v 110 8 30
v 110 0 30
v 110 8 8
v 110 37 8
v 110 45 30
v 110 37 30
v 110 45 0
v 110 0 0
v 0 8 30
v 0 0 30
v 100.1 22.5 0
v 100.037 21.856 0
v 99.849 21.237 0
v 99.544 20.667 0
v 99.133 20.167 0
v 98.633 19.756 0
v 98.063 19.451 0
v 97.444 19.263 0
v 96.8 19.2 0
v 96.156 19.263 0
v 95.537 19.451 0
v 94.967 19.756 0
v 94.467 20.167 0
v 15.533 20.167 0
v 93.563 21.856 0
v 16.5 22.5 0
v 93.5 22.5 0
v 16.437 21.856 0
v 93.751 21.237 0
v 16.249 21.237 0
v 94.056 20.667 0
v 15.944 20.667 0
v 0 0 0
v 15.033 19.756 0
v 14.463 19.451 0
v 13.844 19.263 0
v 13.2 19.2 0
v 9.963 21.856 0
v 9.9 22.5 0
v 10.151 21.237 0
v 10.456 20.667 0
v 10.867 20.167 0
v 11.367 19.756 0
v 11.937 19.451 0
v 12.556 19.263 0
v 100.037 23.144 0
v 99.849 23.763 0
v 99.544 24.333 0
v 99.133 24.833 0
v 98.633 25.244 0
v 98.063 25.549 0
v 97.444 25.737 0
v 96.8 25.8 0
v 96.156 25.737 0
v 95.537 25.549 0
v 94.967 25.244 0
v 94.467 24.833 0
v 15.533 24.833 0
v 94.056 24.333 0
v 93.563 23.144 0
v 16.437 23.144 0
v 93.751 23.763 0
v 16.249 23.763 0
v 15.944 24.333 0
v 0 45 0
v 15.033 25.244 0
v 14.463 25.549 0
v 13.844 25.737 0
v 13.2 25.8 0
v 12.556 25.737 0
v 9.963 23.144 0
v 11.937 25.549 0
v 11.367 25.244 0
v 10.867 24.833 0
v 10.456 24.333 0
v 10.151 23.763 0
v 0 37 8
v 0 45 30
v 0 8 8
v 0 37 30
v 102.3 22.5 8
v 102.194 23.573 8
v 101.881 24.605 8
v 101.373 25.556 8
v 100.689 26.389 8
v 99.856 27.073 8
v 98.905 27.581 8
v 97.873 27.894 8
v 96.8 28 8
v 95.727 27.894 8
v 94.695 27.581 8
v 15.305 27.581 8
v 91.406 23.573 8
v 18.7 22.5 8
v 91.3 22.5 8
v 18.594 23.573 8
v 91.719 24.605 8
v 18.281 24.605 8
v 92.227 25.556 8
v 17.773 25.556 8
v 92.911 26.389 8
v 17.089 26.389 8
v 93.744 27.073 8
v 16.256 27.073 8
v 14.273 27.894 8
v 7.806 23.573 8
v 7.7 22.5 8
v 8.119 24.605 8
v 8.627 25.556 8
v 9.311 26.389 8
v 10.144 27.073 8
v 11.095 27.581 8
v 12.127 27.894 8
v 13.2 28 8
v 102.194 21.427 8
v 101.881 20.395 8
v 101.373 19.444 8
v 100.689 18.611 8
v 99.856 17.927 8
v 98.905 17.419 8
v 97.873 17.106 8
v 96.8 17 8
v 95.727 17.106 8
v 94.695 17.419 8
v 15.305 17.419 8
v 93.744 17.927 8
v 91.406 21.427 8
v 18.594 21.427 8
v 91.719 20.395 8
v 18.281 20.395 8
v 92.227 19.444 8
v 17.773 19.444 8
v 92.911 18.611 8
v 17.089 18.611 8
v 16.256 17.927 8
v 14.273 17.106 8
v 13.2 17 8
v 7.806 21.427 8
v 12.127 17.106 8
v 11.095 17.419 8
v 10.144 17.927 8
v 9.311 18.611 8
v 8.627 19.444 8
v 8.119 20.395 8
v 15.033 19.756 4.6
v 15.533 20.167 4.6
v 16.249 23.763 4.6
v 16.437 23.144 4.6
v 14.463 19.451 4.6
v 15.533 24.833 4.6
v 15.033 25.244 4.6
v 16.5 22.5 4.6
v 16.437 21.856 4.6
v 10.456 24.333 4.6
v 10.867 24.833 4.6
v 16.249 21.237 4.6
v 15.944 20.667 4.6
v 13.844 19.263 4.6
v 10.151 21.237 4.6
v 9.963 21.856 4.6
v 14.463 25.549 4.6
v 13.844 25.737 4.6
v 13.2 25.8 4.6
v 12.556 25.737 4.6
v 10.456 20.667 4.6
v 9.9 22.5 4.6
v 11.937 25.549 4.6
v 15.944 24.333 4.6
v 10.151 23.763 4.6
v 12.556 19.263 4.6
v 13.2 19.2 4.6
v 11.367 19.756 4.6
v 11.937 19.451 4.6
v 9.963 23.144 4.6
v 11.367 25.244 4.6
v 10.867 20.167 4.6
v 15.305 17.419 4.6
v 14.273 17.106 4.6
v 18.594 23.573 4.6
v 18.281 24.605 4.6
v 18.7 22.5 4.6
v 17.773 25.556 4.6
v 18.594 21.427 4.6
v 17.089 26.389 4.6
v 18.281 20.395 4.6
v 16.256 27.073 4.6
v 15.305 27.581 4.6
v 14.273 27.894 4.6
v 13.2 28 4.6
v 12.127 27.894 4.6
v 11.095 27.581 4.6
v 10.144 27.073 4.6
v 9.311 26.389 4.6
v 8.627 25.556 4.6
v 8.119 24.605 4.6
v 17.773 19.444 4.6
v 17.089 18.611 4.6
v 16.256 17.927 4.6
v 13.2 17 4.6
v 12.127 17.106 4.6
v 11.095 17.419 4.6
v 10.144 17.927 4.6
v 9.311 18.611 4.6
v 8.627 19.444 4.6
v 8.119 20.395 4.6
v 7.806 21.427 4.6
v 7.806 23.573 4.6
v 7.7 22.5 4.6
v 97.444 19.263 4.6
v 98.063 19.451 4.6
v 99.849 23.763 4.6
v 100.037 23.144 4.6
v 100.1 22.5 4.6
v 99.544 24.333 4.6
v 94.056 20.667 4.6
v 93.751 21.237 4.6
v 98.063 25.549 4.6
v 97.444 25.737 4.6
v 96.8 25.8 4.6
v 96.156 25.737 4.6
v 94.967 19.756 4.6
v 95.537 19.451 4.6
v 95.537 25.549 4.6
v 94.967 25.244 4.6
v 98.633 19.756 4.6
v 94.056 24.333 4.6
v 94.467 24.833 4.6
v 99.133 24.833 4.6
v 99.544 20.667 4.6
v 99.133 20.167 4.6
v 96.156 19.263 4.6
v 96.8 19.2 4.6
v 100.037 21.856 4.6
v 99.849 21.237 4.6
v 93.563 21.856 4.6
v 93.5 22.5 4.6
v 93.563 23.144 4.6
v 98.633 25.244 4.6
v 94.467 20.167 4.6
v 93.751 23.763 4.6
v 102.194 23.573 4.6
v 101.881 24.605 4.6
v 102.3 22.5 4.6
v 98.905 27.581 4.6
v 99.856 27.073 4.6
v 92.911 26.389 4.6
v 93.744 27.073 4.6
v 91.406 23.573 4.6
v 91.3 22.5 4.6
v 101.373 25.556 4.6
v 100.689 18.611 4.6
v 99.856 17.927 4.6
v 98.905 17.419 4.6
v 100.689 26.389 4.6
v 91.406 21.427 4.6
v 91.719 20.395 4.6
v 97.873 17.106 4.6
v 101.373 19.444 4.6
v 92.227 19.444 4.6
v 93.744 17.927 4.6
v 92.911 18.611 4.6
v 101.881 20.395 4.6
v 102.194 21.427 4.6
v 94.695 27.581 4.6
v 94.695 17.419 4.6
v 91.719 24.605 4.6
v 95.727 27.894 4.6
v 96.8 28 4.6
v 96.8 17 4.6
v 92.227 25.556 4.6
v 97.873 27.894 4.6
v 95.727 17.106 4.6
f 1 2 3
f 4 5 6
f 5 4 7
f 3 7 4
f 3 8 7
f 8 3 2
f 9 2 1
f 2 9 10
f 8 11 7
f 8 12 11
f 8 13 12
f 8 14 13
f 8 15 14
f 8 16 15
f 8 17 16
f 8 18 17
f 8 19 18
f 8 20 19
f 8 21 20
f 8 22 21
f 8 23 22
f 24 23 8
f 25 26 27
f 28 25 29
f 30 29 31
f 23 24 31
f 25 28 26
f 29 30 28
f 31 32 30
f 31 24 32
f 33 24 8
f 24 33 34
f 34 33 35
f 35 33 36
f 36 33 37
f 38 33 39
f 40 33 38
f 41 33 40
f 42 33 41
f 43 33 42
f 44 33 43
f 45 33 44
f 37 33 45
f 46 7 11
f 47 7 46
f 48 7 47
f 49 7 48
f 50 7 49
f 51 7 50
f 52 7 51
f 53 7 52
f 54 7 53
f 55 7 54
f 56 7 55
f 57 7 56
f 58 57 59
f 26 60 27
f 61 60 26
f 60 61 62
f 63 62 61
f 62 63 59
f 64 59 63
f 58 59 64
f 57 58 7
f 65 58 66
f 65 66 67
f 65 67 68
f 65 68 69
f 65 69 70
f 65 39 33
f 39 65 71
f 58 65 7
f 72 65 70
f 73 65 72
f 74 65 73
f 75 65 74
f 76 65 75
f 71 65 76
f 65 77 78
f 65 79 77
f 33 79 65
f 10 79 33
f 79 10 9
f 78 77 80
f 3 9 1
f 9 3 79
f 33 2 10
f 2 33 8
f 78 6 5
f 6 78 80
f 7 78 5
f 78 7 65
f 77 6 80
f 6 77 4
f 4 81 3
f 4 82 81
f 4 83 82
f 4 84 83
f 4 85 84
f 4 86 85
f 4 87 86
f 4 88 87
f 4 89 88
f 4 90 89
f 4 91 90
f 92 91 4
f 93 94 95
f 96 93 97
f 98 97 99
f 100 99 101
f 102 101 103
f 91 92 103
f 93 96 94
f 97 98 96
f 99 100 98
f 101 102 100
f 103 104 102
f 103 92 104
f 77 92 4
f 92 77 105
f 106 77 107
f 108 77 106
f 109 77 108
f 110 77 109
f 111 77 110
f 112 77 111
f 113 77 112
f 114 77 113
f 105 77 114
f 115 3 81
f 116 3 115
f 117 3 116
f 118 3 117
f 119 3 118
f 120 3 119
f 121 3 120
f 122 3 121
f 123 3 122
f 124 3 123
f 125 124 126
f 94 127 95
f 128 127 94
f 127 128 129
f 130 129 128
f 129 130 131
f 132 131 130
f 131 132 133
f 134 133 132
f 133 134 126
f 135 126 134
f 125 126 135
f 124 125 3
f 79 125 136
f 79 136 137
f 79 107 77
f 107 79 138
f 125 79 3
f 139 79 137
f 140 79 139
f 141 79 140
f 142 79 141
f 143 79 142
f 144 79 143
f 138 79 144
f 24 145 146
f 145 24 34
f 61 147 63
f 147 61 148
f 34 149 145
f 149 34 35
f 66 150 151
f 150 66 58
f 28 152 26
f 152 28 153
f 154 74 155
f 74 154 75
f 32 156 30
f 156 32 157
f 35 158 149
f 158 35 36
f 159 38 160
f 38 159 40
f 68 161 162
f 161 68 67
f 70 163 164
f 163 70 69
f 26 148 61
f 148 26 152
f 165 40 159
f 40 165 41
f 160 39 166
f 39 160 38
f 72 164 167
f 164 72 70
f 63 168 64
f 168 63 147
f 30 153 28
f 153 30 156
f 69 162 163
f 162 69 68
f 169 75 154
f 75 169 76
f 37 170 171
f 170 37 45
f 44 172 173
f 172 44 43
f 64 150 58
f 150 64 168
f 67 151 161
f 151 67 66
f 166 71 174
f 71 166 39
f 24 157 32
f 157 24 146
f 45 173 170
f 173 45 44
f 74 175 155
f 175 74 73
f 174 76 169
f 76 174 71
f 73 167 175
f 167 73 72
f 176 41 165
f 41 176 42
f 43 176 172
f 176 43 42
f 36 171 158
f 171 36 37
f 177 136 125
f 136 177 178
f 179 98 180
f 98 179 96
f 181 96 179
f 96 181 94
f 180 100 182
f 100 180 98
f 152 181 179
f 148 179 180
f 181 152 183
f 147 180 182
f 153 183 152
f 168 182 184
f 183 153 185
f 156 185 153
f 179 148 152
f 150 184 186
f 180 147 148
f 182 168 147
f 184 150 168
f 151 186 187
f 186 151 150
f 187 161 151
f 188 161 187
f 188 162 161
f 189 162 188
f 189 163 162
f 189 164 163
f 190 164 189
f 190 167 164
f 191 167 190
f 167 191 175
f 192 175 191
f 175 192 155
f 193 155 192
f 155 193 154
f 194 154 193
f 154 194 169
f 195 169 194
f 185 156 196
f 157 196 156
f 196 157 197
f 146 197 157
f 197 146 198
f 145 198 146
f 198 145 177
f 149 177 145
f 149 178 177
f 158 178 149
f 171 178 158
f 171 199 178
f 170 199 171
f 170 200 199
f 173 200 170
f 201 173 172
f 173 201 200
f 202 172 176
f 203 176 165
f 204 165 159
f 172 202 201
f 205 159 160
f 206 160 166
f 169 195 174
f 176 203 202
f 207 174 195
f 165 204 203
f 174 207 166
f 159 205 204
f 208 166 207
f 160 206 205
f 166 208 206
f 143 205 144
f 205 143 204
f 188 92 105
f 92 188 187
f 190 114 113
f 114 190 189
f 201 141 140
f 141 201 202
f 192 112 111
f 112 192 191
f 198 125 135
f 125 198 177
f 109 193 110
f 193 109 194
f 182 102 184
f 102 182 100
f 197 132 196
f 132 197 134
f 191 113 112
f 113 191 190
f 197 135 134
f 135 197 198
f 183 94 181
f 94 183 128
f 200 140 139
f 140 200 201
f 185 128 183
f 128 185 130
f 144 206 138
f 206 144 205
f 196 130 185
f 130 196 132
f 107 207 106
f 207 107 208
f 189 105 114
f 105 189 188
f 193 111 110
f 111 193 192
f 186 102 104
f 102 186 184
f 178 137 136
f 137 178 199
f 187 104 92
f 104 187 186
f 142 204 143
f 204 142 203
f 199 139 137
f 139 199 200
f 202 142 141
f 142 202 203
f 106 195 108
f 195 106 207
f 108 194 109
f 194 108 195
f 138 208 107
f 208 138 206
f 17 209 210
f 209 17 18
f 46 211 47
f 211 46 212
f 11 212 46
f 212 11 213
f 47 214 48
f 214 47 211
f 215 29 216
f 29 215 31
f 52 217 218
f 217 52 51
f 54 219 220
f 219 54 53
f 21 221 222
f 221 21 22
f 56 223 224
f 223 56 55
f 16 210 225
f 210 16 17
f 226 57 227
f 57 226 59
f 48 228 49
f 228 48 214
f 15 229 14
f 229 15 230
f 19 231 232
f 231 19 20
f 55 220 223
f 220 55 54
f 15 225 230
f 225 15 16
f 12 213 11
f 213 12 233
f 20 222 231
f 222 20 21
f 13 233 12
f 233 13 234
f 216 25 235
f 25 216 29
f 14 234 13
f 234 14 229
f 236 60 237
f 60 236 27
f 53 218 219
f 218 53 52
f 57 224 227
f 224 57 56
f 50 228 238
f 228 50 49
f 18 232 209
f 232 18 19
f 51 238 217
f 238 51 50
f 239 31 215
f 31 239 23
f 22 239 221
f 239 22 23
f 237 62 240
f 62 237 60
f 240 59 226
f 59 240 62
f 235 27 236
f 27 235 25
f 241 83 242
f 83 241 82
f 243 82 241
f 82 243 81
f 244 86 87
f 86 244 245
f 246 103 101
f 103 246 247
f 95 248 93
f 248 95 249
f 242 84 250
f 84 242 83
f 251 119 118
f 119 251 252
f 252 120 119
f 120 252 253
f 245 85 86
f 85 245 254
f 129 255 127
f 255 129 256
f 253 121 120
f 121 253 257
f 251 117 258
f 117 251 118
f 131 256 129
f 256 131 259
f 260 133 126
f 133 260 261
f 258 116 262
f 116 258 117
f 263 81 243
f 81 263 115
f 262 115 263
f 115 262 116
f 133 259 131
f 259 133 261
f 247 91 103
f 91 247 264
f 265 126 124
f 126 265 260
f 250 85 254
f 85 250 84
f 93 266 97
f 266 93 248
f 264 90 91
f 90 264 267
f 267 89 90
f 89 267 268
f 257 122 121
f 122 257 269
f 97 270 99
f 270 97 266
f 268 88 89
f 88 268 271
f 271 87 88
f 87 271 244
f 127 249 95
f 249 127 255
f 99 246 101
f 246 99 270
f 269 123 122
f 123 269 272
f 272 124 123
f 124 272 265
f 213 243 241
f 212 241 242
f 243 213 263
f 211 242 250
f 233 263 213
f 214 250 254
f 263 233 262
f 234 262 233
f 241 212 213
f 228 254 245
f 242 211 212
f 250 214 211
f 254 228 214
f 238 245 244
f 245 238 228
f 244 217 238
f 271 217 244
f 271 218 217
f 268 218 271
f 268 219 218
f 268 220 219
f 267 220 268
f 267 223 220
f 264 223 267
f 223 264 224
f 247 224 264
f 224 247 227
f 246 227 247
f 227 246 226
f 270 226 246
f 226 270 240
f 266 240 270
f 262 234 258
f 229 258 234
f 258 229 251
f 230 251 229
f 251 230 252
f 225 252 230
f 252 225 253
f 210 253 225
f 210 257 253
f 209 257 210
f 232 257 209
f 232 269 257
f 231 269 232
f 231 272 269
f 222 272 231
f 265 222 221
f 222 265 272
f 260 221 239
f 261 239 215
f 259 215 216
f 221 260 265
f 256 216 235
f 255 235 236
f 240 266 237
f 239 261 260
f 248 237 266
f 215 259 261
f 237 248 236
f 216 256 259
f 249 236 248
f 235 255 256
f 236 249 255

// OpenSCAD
$fn = 32;

// ----------------------------------------------------------------------
// U-bracket: 110 x 45 x 30 mm
// ----------------------------------------------------------------------

// --- parameters (mm) ---
span = 110;               // outer length, X
outer_w = 45;             // outer width, Y
wall_h = 30;              // upright height, Z
plate_t = 8;              // wall thickness
hole_d = 6.6;             // clearance for M6
cb_d = 11;                // counterbore diameter
cb_h = 3.4;               // counterbore depth

module hole_z(px, py) {
  translate([px, py, -2.5]) cylinder(h = plate_t + 5, d = hole_d);
}
module hole_y_pz(pz) {
  /* through both uprights along Y */
  translate([0, -2.5, pz]) rotate([-90, 0, 0]) cylinder(h = outer_w + 5, d = hole_d);
}
module cb_z(px, py) {
  translate([px, py, plate_t - cb_h]) cylinder(h = cb_h + 0.4, d = cb_d);
}

module base() {
  cube([span, outer_w, plate_t]);
}

module uprights() {
  cube([span, plate_t, wall_h]);
  translate([0, outer_w - plate_t, 0]) cube([span, plate_t, wall_h]);
}

difference() {
  union() {
    base();
    uprights();
  }
  hole_z(13.2, 22.5);
  cb_z(13.2, 22.5);
  hole_z(96.8, 22.5);
  cb_z(96.8, 22.5);
}
